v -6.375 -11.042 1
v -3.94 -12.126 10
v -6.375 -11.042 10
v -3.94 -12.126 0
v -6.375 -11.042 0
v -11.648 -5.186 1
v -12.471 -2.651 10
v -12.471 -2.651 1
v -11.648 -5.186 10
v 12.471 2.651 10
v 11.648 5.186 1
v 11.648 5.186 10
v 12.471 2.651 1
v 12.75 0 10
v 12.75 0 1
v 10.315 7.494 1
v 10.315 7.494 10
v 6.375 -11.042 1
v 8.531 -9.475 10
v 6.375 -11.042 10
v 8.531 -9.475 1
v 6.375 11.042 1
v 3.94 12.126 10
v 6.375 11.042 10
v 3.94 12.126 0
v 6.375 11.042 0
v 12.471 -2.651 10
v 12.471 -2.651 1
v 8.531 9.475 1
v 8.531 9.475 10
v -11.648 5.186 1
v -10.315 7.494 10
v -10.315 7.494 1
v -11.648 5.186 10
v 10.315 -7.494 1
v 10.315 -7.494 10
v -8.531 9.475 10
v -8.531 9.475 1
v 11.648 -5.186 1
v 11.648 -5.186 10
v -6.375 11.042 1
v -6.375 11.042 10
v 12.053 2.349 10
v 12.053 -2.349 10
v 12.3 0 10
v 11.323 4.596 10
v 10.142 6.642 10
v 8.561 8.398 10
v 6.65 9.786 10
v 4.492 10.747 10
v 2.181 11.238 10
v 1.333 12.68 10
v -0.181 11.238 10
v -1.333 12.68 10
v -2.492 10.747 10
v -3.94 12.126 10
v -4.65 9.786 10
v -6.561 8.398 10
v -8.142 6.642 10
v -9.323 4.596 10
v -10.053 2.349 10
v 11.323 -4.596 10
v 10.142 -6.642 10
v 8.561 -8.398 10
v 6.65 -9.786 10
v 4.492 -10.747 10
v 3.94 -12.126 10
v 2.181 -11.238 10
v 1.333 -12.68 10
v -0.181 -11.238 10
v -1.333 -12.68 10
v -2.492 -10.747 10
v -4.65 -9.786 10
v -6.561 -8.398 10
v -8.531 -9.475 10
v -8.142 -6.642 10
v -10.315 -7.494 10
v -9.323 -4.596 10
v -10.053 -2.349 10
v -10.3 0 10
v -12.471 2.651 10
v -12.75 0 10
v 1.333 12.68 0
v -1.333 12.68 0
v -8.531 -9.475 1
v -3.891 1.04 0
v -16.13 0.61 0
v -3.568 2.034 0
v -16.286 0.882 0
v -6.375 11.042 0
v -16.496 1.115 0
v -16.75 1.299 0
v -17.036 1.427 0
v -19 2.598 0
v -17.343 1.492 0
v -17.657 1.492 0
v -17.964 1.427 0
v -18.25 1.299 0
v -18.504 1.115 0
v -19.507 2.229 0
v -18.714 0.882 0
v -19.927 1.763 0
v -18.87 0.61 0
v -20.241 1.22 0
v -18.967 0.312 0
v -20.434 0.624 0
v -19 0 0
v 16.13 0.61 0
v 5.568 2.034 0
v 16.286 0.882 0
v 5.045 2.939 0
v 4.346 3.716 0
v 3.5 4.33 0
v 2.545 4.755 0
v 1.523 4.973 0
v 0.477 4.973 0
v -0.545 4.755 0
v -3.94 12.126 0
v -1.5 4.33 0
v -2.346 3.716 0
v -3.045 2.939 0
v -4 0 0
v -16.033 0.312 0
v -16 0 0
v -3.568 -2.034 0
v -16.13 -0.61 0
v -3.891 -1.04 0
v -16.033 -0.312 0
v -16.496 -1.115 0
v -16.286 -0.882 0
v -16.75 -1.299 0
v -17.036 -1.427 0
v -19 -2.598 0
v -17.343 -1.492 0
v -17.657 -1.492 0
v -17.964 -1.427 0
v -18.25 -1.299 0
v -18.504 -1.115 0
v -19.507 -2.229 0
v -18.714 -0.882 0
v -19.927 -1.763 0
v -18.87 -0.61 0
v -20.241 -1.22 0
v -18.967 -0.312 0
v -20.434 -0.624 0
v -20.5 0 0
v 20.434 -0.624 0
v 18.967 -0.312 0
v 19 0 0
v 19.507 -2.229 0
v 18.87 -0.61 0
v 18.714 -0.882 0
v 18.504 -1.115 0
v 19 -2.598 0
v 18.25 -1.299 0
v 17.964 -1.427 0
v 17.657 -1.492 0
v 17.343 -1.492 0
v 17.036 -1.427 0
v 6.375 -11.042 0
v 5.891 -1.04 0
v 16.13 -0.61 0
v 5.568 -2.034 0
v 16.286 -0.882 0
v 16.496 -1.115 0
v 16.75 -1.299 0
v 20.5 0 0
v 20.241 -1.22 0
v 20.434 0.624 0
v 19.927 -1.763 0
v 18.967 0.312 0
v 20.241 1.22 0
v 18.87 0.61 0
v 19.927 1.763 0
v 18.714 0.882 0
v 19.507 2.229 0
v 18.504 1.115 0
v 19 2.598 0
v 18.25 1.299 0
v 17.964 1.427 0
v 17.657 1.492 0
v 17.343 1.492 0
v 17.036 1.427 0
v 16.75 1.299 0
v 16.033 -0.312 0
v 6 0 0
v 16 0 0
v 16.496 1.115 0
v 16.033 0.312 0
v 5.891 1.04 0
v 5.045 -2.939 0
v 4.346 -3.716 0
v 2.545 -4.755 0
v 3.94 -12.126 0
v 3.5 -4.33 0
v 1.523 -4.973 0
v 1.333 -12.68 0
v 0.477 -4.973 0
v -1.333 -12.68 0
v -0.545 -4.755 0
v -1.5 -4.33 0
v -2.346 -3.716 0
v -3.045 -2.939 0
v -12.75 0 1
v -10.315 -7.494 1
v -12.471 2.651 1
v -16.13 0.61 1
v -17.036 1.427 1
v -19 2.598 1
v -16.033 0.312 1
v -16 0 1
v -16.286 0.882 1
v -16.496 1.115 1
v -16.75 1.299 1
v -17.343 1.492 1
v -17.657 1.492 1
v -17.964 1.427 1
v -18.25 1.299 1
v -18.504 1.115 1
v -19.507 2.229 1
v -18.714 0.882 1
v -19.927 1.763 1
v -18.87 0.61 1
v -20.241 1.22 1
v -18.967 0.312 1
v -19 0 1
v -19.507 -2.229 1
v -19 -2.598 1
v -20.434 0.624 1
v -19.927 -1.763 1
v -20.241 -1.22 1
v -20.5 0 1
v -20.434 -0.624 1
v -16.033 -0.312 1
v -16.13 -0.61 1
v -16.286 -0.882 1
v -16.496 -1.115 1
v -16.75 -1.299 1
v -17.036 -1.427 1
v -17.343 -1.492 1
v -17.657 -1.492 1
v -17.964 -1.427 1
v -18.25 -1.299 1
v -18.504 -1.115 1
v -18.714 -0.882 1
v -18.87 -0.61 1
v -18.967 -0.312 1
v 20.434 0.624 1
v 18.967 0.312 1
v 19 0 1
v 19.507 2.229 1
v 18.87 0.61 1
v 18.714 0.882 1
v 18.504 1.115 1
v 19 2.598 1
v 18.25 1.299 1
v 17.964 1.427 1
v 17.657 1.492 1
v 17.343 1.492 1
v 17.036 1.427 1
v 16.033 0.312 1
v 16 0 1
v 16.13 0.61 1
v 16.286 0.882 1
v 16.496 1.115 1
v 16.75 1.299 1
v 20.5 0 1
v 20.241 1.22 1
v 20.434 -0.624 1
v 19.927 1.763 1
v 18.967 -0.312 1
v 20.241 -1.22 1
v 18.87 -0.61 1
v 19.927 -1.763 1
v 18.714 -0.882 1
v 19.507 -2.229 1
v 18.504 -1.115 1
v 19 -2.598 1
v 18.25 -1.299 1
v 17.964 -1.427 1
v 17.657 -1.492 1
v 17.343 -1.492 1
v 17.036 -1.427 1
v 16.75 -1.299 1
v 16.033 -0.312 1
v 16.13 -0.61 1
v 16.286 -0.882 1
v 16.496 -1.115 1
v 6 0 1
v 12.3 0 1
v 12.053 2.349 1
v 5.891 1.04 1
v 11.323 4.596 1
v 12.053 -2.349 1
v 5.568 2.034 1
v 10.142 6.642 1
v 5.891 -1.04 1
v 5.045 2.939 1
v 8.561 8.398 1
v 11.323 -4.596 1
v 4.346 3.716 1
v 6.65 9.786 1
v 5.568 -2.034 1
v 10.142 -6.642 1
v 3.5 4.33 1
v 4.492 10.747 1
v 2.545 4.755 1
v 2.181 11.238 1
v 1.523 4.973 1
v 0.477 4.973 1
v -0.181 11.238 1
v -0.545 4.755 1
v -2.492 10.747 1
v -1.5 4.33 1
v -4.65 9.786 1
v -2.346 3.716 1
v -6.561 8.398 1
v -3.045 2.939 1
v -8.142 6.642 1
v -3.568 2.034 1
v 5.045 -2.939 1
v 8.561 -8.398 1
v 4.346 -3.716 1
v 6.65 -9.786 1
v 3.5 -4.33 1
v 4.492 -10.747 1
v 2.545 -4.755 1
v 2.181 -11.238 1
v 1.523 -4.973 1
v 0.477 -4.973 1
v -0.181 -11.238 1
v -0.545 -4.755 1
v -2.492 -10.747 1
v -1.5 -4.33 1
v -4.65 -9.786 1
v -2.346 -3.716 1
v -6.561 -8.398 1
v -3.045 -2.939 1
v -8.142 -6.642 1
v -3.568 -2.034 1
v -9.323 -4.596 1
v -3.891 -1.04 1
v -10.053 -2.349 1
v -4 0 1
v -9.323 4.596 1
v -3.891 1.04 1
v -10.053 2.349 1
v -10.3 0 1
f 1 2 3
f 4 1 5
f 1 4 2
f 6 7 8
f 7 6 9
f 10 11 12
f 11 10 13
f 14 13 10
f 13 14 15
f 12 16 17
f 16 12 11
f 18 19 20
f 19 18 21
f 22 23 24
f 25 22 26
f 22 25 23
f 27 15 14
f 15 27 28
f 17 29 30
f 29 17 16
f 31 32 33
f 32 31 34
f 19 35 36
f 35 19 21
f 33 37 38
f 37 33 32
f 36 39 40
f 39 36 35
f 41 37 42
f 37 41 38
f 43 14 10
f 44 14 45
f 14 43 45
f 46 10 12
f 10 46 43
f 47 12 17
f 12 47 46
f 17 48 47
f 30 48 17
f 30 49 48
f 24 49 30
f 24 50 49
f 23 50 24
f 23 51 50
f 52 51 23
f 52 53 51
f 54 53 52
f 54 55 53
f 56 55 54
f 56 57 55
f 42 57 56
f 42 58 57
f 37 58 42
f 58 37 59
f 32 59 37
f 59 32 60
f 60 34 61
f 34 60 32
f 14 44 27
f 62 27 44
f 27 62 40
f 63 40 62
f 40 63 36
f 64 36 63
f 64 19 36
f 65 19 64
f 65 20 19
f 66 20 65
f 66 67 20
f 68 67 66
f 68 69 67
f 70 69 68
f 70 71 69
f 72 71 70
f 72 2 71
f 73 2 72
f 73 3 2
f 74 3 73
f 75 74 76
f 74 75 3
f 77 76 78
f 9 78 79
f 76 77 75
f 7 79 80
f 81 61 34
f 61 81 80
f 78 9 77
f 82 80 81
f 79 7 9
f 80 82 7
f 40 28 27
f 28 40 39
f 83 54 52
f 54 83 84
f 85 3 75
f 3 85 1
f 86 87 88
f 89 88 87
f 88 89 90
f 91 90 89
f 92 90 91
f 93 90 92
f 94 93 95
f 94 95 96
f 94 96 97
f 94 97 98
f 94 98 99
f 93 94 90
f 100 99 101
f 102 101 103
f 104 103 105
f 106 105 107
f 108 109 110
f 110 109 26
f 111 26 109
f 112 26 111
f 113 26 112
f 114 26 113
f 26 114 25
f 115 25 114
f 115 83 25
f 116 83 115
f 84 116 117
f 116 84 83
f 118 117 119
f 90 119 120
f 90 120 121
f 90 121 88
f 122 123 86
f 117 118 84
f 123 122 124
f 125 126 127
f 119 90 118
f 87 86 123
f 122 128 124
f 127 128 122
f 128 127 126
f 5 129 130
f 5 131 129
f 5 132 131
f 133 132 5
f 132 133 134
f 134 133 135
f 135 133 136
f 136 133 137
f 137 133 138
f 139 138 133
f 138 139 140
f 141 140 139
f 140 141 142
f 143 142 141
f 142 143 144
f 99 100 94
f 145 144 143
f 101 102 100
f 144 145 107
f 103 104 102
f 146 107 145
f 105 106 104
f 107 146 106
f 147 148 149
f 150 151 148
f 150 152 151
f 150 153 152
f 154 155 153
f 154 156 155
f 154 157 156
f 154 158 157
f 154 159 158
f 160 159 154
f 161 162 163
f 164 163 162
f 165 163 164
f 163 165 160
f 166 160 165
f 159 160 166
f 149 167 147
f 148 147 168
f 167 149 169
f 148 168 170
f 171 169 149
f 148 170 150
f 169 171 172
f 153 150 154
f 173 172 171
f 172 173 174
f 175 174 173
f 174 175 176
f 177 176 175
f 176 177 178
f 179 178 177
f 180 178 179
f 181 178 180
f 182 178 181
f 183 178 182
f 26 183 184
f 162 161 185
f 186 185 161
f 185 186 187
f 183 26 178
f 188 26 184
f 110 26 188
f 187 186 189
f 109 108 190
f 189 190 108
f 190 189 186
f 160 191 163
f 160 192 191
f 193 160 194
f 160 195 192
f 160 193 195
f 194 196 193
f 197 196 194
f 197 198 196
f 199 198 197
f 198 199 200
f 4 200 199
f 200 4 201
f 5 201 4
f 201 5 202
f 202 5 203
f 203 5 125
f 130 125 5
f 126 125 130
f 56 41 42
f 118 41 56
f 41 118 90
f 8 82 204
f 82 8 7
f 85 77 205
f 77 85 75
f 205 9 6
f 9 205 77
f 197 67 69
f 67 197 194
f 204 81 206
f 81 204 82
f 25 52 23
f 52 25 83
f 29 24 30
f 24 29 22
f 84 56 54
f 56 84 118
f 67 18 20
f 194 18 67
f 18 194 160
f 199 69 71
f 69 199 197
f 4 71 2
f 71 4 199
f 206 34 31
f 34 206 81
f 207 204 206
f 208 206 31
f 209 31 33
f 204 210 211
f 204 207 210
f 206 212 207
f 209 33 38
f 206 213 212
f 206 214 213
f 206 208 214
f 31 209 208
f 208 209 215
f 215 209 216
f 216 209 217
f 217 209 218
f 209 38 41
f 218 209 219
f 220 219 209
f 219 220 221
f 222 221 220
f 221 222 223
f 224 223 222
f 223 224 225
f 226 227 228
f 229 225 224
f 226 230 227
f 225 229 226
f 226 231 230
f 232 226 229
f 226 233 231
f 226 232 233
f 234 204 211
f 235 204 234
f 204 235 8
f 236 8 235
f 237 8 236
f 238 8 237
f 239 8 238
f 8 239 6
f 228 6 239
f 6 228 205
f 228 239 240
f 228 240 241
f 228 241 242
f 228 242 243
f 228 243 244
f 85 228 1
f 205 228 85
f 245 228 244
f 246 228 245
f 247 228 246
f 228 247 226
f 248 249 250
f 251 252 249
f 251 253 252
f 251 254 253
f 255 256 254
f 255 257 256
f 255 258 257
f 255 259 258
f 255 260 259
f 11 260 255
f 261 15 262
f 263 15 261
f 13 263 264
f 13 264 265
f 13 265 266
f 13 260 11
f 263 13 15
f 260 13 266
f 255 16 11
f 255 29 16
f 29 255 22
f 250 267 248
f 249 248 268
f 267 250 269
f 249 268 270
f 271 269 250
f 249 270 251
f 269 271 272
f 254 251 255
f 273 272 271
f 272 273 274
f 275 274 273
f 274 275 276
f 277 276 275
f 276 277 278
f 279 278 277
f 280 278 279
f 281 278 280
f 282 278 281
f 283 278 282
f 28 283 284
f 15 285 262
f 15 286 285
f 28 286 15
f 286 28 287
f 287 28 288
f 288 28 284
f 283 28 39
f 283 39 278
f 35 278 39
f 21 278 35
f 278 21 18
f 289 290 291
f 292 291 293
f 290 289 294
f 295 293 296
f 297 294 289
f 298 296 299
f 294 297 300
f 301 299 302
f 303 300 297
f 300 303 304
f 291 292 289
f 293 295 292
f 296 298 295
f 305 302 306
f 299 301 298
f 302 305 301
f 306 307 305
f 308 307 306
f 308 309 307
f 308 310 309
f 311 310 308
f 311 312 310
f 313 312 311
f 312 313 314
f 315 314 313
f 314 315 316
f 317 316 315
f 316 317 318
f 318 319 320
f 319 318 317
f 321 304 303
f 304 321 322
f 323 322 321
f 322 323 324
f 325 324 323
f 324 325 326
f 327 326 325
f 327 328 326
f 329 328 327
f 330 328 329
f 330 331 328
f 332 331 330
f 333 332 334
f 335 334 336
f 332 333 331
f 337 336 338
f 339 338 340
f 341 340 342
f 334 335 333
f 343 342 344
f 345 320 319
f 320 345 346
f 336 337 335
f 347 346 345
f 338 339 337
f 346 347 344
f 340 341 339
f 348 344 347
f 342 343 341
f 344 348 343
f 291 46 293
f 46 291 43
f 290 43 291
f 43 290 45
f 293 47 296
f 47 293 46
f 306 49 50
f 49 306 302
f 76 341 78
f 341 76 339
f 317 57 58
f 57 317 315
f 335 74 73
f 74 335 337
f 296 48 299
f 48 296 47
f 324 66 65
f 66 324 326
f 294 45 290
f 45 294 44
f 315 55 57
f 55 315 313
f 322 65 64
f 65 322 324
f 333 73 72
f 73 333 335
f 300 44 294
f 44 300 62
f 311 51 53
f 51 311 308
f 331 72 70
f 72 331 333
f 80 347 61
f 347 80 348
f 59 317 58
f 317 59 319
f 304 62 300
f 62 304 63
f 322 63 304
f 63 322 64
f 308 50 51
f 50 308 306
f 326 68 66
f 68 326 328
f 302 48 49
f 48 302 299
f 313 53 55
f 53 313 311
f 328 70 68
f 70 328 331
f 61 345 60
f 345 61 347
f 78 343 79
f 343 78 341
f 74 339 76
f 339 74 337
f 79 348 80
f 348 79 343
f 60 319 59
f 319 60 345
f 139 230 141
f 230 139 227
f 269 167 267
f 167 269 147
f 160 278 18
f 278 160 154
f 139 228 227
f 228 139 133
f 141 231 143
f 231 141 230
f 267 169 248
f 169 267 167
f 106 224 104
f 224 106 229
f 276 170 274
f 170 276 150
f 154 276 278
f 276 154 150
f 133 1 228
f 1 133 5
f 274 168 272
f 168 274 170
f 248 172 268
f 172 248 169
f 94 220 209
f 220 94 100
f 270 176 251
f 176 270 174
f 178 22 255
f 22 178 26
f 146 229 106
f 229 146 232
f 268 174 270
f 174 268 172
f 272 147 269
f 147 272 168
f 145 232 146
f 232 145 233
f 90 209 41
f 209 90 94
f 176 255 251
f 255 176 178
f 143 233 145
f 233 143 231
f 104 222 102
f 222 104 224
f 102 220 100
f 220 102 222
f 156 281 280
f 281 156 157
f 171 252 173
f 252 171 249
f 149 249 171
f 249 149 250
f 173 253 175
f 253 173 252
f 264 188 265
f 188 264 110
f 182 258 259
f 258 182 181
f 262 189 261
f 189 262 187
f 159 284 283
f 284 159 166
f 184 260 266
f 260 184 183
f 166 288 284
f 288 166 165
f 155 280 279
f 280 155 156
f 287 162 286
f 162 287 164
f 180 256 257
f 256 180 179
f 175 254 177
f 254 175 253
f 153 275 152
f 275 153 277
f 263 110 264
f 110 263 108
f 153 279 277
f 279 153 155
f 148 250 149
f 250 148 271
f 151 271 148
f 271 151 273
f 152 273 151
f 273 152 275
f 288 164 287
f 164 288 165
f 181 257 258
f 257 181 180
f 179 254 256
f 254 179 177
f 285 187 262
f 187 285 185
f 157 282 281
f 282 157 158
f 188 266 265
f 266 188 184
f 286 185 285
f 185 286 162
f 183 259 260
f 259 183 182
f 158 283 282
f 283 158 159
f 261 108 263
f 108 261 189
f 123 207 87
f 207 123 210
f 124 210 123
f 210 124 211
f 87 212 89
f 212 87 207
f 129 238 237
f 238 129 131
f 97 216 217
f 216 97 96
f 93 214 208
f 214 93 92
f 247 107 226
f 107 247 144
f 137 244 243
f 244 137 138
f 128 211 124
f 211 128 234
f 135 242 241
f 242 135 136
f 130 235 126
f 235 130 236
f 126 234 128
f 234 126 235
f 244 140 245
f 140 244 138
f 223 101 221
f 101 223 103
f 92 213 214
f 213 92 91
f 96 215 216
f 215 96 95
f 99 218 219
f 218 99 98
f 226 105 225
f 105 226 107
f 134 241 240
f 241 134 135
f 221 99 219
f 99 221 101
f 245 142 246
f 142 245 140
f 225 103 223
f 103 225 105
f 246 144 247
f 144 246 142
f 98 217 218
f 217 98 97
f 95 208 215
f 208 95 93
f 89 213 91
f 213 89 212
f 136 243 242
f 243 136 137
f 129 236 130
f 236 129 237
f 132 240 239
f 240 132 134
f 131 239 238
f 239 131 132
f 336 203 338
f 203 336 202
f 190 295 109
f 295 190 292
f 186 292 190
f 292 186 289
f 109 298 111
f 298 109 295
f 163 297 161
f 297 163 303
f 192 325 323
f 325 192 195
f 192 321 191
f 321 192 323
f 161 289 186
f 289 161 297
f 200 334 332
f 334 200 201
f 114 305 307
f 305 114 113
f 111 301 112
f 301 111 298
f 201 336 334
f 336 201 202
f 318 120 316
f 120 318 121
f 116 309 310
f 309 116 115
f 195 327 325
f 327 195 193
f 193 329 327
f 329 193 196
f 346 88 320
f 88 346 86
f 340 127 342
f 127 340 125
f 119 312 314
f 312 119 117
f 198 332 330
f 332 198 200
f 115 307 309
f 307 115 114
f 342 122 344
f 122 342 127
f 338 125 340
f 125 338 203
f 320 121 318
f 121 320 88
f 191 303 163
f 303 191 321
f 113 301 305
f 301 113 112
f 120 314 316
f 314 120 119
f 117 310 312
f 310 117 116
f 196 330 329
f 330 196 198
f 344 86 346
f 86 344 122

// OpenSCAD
bearing = 22.6;
woodhole = 25.5;
screw = 3;
screw_distance = 35;
wall = 1;
h = 10;
off = 1;
difference() {
    union() {
        difference() {
    translate([0,0,0]) cylinder(d=woodhole, h=h, $fn=30);
    translate([off,0,wall]) cylinder(d=bearing, h=h, $fn=30);
}
    hull() {
        
        translate([screw_distance/2,0,0]) cylinder(d=screw*2, h=wall, $fn=30);
        translate([-screw_distance/2,0,0]) cylinder(d=screw*2, h=wall, $fn=30);
        translate([0,0,0]) cylinder(d=woodhole, h=wall, $fn=30);
    }
}
    translate([screw_distance/2,0,-1]) cylinder(d=screw, h=h, $fn=30);
    translate([-screw_distance/2,0,-1]) cylinder(d=screw, h=h, $fn=30);
    translate([off,0,-1]) cylinder(d=10, h=h, $fn=30);
}
